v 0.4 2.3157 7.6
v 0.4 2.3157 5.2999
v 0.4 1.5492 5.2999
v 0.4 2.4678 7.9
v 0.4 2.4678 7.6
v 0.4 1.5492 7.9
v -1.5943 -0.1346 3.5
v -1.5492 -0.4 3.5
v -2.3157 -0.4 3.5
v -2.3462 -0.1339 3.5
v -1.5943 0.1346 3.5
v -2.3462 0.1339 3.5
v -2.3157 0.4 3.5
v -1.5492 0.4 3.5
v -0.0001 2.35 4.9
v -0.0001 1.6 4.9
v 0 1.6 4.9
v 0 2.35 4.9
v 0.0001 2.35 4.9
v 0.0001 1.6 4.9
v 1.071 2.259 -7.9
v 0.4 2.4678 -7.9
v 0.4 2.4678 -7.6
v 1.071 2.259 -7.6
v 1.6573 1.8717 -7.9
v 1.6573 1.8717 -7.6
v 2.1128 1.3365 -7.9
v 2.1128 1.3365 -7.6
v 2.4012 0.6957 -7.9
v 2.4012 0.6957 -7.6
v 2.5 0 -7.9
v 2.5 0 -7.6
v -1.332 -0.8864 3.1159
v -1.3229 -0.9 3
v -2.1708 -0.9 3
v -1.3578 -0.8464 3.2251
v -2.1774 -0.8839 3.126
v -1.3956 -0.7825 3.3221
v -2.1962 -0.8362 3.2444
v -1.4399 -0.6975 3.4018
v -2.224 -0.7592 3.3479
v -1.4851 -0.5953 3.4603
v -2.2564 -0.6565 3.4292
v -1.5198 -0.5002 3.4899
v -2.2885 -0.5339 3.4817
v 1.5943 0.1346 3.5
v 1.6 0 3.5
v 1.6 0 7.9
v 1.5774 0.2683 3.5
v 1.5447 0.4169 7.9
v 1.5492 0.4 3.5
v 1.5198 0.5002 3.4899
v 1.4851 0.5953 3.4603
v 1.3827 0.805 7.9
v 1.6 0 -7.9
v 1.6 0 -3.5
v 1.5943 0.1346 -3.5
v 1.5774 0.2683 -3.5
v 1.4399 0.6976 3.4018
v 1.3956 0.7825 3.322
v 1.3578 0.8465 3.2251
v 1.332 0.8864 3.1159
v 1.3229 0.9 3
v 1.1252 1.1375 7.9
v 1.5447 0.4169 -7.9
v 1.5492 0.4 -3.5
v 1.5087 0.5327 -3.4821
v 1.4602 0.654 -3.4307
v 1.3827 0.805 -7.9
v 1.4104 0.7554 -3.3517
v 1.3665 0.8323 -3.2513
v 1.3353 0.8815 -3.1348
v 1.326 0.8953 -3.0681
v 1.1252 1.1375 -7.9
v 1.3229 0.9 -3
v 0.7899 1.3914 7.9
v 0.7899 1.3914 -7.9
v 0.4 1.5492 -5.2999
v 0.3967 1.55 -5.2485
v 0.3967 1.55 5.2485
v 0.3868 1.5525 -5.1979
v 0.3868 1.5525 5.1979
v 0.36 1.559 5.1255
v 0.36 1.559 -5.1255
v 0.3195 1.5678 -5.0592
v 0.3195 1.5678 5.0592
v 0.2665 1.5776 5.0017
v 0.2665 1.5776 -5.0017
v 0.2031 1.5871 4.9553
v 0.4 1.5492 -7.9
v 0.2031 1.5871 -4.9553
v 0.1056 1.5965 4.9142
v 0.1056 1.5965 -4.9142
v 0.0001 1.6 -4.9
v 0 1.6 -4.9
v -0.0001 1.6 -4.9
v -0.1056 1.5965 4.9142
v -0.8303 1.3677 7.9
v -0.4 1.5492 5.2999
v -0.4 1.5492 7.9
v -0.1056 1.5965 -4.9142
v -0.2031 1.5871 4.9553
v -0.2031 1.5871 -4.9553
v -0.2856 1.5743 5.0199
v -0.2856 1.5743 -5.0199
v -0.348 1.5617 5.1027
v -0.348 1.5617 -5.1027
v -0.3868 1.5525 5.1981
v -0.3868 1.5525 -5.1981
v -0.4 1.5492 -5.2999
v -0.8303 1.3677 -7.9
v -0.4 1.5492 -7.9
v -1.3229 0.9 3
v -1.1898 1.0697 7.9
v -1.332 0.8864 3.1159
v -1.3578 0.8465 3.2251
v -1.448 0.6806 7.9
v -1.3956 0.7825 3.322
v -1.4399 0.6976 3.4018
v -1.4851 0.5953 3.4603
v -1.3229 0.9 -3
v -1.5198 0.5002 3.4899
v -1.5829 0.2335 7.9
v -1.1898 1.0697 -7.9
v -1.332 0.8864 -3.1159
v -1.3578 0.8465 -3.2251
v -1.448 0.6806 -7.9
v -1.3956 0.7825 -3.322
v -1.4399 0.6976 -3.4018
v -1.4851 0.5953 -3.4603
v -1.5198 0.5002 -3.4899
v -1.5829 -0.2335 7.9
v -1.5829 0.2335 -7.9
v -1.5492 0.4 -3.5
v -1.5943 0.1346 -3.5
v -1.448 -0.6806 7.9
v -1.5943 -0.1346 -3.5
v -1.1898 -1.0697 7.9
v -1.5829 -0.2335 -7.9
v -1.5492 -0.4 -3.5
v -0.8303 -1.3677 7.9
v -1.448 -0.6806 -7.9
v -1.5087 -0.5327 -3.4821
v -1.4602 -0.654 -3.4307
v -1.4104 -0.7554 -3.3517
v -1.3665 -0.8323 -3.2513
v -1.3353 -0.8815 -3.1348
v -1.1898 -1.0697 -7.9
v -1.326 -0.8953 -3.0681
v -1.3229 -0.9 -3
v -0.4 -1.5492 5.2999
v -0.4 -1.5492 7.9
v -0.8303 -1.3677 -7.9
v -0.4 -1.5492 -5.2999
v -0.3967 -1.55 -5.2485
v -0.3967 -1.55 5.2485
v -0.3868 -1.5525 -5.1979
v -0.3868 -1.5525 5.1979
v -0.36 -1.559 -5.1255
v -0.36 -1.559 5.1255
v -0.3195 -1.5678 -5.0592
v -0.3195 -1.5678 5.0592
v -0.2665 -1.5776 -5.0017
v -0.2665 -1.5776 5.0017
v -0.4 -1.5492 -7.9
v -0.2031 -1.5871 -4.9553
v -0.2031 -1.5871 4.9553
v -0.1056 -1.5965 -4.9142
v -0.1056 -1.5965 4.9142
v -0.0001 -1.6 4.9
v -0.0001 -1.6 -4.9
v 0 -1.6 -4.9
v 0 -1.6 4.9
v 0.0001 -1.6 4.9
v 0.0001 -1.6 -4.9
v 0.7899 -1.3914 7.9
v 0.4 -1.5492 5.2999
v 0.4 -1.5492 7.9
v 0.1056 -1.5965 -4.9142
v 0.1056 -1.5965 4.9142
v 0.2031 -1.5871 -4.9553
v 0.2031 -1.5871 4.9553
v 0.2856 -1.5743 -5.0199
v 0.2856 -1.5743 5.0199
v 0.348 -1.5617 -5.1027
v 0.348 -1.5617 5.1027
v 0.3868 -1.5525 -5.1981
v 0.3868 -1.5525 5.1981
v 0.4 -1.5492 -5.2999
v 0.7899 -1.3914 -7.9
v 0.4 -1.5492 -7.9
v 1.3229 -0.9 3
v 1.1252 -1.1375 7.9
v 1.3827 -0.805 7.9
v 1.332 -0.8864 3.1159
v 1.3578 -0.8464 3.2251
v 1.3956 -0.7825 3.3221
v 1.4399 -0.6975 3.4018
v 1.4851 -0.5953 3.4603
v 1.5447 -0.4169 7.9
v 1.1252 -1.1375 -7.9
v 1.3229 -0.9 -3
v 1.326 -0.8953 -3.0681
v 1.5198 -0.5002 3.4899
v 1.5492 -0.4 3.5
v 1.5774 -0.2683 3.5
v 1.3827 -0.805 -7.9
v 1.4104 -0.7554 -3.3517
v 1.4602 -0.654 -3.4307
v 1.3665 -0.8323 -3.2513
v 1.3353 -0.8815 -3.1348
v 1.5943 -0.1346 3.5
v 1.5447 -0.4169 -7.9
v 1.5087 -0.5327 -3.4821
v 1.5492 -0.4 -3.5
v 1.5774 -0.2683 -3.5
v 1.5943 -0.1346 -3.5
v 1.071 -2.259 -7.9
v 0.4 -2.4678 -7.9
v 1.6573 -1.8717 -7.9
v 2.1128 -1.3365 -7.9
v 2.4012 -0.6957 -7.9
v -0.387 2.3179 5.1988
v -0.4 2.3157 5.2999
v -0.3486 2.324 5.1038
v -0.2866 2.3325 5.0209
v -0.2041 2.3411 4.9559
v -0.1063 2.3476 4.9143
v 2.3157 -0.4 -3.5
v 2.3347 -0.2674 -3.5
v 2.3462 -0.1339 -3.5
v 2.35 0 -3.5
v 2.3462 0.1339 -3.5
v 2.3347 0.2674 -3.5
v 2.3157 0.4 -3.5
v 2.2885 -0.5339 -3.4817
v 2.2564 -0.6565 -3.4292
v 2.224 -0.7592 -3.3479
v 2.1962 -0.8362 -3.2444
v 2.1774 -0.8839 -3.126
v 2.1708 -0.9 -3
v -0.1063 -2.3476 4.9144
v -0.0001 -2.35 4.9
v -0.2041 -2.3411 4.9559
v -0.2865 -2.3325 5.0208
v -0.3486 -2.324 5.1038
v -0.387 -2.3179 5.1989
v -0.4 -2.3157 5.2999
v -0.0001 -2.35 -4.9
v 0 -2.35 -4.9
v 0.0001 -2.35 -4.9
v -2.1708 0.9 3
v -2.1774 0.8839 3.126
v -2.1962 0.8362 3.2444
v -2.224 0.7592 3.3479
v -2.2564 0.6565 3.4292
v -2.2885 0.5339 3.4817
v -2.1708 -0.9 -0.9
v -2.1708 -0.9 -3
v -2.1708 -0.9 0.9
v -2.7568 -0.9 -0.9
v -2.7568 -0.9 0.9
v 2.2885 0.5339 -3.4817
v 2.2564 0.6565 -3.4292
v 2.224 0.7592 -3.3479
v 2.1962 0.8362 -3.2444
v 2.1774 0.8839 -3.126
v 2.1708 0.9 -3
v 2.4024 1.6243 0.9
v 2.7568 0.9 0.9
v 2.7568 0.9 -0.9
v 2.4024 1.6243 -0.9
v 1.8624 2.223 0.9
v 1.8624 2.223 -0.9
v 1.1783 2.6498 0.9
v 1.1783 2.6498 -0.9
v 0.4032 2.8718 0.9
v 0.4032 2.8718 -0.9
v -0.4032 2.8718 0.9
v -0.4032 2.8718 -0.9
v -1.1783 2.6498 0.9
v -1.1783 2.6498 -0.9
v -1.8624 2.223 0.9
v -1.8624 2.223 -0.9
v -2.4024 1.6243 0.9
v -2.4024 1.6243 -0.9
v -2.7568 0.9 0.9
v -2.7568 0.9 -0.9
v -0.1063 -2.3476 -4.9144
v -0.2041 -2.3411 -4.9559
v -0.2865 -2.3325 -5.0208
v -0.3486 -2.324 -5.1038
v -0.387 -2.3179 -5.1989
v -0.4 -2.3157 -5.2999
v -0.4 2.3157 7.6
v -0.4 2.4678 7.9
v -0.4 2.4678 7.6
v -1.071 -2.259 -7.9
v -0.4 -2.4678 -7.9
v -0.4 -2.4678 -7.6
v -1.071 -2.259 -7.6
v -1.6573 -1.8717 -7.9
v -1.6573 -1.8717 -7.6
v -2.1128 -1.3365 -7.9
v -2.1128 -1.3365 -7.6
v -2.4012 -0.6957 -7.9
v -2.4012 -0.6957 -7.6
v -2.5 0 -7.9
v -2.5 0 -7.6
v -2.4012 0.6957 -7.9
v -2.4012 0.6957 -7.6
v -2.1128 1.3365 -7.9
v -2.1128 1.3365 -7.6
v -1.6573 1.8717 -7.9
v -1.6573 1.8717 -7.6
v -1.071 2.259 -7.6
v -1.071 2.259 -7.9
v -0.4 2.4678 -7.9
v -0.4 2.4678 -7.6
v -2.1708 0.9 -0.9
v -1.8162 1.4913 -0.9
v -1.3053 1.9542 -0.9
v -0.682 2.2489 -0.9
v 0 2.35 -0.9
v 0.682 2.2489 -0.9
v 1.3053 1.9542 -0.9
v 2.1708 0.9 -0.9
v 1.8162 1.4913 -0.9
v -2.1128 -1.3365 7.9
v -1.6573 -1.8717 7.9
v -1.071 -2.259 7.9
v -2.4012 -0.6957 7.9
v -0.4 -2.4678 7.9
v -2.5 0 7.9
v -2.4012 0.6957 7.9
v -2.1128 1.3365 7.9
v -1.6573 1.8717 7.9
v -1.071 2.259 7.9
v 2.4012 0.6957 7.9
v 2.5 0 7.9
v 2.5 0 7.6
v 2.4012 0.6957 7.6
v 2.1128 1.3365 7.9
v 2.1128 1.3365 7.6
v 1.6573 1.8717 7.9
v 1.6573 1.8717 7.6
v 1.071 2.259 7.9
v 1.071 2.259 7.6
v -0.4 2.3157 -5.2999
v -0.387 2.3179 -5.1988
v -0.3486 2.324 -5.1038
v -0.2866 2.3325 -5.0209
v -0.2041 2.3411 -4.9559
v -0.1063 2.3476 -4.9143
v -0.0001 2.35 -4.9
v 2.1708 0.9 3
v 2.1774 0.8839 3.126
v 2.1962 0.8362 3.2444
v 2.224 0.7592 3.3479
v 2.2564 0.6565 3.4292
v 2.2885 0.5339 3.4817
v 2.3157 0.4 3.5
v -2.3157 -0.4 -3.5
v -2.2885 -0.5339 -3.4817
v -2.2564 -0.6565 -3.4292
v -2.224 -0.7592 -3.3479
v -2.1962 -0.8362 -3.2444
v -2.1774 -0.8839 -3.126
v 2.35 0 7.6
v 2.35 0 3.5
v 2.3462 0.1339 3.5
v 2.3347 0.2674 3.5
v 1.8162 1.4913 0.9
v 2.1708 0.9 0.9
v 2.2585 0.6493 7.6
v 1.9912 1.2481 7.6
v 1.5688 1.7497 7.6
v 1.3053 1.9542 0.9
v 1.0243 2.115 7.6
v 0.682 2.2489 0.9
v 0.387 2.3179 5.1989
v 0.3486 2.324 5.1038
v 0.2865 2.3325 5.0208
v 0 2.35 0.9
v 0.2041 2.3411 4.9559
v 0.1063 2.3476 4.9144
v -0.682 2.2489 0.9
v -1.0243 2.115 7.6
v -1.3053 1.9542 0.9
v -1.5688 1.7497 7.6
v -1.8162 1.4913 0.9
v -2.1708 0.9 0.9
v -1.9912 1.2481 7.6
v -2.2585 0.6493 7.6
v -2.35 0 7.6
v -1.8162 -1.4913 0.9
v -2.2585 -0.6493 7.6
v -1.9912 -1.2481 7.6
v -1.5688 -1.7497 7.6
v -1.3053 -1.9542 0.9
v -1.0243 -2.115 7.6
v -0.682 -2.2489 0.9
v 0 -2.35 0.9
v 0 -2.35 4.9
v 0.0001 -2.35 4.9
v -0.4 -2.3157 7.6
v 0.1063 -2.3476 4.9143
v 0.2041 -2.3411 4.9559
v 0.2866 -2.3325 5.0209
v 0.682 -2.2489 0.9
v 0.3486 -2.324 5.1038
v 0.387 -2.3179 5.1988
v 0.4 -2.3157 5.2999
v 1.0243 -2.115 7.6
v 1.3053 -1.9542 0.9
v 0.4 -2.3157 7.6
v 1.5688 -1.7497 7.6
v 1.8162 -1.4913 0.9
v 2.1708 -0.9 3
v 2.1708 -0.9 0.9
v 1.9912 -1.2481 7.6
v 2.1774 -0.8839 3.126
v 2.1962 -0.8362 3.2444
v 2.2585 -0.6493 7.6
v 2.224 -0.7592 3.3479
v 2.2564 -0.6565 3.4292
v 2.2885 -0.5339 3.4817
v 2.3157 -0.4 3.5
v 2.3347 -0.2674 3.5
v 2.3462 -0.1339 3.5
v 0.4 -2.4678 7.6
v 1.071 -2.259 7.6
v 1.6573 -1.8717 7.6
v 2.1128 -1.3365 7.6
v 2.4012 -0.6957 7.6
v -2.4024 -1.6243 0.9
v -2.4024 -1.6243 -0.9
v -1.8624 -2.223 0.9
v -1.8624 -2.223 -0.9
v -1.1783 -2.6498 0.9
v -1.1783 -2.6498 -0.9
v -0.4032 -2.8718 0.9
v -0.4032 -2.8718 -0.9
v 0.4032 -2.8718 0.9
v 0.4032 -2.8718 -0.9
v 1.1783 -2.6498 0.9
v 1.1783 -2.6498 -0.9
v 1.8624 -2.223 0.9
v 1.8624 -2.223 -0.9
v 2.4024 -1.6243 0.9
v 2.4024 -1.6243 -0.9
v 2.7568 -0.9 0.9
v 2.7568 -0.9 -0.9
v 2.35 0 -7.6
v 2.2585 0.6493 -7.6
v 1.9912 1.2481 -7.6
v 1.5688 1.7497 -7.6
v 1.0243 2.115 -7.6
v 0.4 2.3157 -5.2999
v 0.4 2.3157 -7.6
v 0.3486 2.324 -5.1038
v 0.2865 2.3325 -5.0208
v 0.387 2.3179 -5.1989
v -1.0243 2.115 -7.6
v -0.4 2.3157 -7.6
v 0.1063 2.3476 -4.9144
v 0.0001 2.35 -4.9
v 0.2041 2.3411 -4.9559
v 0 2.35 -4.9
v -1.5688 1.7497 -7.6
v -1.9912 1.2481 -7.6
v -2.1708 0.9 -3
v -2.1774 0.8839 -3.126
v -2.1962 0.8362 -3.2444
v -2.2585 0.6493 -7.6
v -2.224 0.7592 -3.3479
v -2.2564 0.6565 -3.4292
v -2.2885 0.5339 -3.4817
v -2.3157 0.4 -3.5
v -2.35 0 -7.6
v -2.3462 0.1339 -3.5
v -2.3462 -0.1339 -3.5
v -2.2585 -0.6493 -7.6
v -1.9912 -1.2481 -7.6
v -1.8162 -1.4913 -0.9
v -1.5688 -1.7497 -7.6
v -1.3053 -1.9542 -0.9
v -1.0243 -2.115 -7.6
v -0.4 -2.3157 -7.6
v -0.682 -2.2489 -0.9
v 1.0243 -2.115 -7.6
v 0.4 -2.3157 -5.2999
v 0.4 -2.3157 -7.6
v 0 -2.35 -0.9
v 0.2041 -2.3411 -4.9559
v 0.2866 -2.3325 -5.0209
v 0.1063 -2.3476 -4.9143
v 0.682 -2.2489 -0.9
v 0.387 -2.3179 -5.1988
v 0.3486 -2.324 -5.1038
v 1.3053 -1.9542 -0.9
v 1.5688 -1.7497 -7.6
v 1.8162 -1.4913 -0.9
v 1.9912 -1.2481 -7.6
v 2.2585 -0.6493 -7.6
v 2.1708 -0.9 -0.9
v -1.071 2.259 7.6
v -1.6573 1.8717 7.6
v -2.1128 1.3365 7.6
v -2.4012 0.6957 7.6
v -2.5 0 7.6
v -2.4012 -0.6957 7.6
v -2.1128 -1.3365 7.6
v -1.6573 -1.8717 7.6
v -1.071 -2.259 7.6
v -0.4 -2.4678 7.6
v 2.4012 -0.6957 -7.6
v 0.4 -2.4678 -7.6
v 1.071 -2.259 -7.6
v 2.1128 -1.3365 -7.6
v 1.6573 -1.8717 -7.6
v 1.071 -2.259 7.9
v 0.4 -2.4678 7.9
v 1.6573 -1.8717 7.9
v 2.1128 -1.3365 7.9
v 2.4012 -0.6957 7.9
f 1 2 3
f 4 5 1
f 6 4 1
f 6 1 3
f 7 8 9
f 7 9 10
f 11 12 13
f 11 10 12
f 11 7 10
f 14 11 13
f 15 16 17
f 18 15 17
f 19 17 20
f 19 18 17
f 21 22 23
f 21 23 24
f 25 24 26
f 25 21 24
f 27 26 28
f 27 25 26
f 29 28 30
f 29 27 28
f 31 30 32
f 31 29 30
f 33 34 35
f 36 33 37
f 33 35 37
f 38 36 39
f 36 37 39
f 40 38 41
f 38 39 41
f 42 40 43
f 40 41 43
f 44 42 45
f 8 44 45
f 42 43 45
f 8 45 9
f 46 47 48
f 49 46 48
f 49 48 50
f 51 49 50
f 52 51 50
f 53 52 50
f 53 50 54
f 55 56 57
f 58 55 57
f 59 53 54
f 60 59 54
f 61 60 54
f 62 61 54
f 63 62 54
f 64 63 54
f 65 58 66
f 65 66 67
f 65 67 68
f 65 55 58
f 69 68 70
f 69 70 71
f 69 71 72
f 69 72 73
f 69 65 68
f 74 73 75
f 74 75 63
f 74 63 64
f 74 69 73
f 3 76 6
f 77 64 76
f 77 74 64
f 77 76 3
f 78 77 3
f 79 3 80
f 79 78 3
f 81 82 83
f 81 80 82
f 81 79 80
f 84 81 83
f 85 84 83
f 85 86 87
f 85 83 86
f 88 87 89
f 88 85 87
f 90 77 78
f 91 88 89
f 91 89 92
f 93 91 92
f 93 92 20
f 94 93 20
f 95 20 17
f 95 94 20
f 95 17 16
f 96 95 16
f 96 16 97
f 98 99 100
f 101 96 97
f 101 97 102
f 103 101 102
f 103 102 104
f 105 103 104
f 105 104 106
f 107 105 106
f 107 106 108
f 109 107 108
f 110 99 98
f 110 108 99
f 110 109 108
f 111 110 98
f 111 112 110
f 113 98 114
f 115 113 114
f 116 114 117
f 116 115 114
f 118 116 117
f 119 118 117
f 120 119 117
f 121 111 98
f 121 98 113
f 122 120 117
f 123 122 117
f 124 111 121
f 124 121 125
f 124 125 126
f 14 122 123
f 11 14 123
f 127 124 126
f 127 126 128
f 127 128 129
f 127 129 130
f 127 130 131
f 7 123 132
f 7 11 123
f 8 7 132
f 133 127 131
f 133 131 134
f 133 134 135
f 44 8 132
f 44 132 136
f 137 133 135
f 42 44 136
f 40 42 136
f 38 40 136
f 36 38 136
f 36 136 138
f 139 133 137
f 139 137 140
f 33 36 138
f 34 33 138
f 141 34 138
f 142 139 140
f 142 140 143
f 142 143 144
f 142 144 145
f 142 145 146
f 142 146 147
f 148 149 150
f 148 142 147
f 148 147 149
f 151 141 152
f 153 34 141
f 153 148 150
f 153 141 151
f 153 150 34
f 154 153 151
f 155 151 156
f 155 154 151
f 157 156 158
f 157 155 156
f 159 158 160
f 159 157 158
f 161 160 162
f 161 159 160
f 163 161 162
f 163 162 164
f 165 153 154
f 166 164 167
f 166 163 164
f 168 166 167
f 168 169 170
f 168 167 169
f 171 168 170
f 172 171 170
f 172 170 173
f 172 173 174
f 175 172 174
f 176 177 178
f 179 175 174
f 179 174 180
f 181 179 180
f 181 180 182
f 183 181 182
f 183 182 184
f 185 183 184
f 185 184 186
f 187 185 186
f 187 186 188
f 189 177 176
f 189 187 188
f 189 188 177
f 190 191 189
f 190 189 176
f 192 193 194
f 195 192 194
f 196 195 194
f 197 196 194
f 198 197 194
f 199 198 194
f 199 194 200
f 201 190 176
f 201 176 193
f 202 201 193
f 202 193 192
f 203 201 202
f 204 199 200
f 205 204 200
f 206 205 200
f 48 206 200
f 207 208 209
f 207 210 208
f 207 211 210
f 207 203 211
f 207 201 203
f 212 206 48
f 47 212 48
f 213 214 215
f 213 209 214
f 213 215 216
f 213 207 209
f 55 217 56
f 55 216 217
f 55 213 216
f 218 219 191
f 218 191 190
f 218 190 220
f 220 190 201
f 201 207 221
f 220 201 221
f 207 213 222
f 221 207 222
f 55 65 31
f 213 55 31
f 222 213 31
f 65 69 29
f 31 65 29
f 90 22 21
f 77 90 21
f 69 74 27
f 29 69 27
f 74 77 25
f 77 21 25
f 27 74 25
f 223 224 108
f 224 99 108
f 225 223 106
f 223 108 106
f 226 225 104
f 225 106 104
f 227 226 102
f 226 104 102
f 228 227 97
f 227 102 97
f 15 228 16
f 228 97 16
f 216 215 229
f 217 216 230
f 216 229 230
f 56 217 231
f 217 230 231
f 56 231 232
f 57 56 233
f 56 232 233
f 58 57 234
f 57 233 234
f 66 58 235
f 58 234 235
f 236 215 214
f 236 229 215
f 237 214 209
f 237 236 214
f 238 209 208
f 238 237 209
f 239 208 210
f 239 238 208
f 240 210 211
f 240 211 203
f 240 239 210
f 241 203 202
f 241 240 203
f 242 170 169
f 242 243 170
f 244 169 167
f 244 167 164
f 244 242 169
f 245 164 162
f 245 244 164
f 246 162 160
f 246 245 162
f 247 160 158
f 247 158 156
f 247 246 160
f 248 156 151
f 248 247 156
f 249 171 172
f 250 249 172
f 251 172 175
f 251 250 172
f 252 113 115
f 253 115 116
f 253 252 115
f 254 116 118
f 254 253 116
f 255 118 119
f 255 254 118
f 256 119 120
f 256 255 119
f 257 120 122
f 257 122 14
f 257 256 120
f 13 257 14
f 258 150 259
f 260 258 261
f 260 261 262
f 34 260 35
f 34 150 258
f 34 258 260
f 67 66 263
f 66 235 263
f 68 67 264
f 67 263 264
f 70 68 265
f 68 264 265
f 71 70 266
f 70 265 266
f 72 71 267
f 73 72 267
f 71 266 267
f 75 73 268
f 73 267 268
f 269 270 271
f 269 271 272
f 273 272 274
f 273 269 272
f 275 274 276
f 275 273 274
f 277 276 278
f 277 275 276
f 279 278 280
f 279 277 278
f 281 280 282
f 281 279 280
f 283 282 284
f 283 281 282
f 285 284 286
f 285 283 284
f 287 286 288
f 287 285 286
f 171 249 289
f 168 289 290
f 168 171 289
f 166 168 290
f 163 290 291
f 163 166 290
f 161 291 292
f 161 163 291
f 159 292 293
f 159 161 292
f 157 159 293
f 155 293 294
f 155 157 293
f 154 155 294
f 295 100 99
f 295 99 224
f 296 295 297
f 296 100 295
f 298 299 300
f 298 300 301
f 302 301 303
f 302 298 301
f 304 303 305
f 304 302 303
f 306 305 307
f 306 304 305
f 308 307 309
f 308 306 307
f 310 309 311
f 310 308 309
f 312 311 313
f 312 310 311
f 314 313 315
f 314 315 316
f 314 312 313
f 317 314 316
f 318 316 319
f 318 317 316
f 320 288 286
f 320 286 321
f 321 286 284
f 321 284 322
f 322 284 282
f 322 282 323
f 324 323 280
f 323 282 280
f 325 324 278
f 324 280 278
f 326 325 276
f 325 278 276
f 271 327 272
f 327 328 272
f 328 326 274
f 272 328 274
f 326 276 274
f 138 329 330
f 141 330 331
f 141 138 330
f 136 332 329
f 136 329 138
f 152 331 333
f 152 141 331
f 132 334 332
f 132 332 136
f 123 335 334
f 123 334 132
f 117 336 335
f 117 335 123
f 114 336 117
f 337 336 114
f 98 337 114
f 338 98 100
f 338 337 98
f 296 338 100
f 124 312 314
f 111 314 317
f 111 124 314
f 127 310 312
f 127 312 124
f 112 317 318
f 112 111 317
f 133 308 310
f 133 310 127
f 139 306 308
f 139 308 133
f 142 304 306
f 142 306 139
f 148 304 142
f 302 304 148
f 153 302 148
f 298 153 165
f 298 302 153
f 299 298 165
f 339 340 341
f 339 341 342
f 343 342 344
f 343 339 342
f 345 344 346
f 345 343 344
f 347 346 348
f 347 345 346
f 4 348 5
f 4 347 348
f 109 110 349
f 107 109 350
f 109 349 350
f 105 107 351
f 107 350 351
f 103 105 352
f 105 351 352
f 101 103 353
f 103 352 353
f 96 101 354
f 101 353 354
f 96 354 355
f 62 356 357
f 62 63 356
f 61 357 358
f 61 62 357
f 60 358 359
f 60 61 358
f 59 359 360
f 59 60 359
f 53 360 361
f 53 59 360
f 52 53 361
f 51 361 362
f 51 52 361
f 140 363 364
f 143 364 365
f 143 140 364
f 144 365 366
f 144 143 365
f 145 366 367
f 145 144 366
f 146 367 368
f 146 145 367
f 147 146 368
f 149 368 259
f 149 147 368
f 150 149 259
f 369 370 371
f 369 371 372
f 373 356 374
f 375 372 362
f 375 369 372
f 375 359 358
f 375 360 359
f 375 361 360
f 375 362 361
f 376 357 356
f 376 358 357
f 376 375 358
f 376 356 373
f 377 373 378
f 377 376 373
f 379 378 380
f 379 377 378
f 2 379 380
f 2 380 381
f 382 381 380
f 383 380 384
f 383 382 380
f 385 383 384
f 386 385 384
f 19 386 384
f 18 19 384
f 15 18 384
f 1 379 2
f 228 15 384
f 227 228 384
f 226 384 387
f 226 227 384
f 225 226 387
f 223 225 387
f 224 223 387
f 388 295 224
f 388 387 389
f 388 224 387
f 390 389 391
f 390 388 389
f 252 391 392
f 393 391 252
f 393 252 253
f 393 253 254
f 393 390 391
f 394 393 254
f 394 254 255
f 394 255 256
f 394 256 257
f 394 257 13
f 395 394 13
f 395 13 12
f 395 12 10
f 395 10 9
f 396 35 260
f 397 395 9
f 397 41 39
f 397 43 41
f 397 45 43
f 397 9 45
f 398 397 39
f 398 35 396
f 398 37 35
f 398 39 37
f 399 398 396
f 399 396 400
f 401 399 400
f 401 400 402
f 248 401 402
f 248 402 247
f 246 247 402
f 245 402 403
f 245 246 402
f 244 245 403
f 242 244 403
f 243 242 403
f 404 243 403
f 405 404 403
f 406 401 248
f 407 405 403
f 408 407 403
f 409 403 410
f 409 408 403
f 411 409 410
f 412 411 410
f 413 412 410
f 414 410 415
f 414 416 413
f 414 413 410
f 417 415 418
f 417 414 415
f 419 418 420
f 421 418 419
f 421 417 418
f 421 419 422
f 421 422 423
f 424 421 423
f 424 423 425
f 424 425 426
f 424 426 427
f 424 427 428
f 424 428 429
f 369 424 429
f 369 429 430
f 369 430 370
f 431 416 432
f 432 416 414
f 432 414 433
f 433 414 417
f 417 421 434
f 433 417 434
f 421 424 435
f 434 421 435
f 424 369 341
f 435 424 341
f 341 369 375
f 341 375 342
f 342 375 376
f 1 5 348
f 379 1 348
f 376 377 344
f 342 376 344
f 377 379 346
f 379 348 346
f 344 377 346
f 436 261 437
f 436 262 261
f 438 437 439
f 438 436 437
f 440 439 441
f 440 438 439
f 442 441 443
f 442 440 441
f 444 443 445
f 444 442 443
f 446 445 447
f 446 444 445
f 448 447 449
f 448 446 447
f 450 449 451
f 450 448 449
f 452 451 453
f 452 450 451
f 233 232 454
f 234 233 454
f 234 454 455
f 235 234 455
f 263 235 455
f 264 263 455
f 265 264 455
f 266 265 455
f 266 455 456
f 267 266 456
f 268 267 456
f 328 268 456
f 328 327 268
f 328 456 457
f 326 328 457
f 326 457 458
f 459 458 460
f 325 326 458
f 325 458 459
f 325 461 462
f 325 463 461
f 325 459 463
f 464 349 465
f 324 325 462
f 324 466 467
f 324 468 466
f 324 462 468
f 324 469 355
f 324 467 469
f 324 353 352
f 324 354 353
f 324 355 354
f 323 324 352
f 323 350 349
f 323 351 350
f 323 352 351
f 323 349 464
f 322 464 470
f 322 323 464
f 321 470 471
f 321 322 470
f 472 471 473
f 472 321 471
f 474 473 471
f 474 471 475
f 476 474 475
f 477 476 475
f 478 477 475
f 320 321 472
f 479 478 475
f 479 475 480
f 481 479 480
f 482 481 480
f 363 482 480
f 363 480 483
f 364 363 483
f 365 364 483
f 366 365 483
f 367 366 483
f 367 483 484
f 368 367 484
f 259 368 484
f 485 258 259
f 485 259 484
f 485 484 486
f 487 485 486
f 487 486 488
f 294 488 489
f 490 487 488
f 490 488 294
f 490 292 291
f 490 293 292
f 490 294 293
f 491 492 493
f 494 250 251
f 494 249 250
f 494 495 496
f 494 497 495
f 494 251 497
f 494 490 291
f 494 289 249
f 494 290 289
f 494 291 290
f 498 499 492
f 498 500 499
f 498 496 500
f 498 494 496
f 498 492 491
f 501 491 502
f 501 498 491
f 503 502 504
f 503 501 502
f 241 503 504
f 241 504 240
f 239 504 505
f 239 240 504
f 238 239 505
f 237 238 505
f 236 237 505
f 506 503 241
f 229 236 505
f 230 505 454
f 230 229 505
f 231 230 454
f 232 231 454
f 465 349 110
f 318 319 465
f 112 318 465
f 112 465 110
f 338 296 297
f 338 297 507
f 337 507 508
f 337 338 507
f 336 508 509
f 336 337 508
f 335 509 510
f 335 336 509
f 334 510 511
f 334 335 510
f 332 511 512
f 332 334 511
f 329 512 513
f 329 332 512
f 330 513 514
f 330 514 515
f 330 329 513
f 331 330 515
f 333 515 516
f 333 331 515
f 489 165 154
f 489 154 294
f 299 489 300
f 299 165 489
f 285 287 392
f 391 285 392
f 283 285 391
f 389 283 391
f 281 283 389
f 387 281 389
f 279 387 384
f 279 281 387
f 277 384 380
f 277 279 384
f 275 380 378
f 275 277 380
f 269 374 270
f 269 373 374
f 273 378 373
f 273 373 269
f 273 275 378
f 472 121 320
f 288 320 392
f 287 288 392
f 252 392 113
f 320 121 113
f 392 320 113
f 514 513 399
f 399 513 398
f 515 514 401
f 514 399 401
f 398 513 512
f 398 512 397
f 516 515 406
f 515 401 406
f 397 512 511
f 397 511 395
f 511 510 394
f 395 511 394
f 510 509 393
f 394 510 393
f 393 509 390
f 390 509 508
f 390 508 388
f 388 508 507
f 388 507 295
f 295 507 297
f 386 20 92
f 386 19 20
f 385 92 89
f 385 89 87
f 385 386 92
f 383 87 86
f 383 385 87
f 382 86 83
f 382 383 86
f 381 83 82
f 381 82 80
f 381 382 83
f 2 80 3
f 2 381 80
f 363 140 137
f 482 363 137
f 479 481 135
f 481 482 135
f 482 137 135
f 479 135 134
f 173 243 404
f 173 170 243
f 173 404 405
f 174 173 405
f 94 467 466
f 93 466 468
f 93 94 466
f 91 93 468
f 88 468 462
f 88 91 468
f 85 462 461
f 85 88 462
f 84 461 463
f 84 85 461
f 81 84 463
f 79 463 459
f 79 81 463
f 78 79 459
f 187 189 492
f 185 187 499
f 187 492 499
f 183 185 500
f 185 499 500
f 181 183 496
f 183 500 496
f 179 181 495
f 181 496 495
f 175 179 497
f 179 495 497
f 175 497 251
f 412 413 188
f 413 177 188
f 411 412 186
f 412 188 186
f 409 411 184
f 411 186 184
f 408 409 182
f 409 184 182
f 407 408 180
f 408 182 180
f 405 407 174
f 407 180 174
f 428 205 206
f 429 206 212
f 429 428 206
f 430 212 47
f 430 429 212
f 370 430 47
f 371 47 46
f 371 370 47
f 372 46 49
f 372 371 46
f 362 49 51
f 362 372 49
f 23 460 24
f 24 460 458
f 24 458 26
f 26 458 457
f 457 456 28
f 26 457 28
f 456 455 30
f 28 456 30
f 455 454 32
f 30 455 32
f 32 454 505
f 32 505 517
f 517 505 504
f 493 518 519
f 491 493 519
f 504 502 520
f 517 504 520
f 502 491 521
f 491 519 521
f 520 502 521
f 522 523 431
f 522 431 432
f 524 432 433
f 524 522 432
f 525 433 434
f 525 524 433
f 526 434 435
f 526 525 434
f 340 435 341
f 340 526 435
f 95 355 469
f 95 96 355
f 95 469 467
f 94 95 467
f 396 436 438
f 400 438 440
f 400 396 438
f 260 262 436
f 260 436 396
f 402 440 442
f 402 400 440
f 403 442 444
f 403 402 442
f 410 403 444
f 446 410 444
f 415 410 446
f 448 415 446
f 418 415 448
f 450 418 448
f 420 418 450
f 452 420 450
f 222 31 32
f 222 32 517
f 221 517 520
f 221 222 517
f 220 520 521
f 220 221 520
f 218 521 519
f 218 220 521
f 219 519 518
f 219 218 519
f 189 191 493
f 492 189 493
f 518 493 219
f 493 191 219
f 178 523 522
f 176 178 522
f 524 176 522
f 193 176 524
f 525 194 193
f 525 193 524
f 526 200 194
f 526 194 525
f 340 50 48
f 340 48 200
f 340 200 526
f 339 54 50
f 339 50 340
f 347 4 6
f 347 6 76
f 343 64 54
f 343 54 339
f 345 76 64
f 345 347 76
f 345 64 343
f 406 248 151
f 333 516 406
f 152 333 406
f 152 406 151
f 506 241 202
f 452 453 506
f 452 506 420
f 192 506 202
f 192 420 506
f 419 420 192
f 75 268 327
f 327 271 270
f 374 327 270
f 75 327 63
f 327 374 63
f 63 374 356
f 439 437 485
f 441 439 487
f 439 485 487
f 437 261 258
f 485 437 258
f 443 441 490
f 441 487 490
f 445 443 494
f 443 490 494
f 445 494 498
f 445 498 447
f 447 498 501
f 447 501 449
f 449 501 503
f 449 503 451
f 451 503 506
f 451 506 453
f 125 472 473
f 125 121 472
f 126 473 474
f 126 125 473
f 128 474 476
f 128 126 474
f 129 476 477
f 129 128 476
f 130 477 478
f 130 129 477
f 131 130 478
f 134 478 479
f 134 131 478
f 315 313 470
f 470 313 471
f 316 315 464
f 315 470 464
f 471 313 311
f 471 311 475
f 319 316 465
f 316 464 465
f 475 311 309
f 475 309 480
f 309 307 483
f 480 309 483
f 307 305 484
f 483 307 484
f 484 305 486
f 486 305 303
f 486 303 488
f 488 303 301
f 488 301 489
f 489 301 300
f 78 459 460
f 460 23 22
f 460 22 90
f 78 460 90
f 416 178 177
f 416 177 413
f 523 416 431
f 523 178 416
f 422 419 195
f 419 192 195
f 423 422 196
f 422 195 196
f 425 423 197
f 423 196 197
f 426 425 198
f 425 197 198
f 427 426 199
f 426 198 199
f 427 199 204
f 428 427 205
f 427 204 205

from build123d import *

# Parameters (mm, degrees)
F0_R      = 2.35
F0_R_2    = 1.6
F1_DEPTH  = 7.9
F3_DEPTH  = 3
F0_R_3    = 2.9
F4_DEPTH  = 0.9
F5_W      = 1.8
F5_H      = 7
F6_DEPTH  = 12.5
F7_R      = 0.5
F9_DEPTH  = 3
F10_R     = 0.3999
F12_DEPTH = 0.3
F14_DEPTH = 0.3
F16_DEPTH = 0.3


# Not quite as in the source:
# - a fillet or chamfer is up to 0.001 mm smaller than in the source, because OpenCascade refuses the exact size


with BuildPart() as f1:
    # F0 (on Top) → F1 (new body, symmetric)
    with BuildSketch(Plane.XY):
        Circle(F0_R)
        Circle(F0_R_2, mode=Mode.SUBTRACT)
    extrude(amount=F1_DEPTH, both=True)

    # F2 (on face) → F3 (cut)
    with BuildSketch(Plane.XY.offset(7.9)):
        with BuildLine():
            ThreePointArc((-0.4, 1.5491933385), (-0.201606868, 1.587247514), (0, 1.6))
            ThreePointArc((0, 1.6), (0.201606868, 1.587247514), (0.4, 1.5491933385))
            Line((0.4, 1.5491933385), (0.4, 1.6))
            Line((0.4, 1.6), (0.4, 2.3157072354))
            ThreePointArc((0.4, 2.3157072354), (0, 2.35), (-0.4, 2.3157072354))
            Line((-0.4, 2.3157072354), (-0.4, 1.6))
            Line((-0.4, 1.6), (-0.4, 1.5491933385))
        make_face()
        with BuildLine():
            ThreePointArc((0.4, -1.5491933385), (0.201606868, -1.587247514), (0, -1.6))
            ThreePointArc((0, -1.6), (-0.201606868, -1.587247514), (-0.4, -1.5491933385))
            Line((-0.4, -1.5491933385), (-0.4, -1.6))
            Line((-0.4, -1.6), (-0.4, -2.3157072354))
            ThreePointArc((-0.4, -2.3157072354), (0, -2.35), (0.4, -2.3157072354))
            Line((0.4, -2.3157072354), (0.4, -1.6))
            Line((0.4, -1.6), (0.4, -1.5491933385))
        make_face()
    extrude(amount=-F3_DEPTH, mode=Mode.SUBTRACT)

    # F0 (on Top) → F4 (join, symmetric)
    with BuildSketch(Plane.XY):
        Circle(F0_R_3)
        Circle(F0_R, mode=Mode.SUBTRACT)
    extrude(amount=F4_DEPTH, both=True)

    # F5 (on Right) → F6 (cut, symmetric)
    with BuildSketch(Plane.YZ):
        Rectangle(F5_W, F5_H)
    extrude(amount=F6_DEPTH, both=True, mode=Mode.SUBTRACT)

    # F7
    f7_edges = [f1.edges().sort_by_distance(p)[0] for p in [
        (-1.746852, -0.9, 3.5),
        (1.746852, -0.9, 3.5),
        (1.746852, 0.9, 3.5),
        (-1.746852, 0.9, 3.5),
        (1.746852, -0.9, -3.5),
        (-1.746852, -0.9, -3.5),
        (1.746852, 0.9, -3.5),
        (-1.746852, 0.9, -3.5),
    ]]
    fillet(f7_edges, radius=F7_R)

    # F8 (on face) → F9 (cut)
    with BuildSketch(Plane(origin=(0, 0, -7.9), x_dir=(1, 0, 0), z_dir=(0, 0, -1))):
        with BuildLine():
            Line((0.4, 1.5491933385), (0.4, 1.6))
            Line((0.4, 1.6), (0.4, 2.3157072354))
            ThreePointArc((0.4, 2.3157072354), (0, 2.35), (-0.4, 2.3157072354))
            Line((-0.4, 2.3157072354), (-0.4, 1.6))
            Line((-0.4, 1.6), (-0.4, 1.5491933385))
            ThreePointArc((-0.4, 1.5491933385), (0, 1.6), (0.4, 1.5491933385))
        make_face()
        with BuildLine():
            ThreePointArc((-0.4, -2.3157072354), (0, -2.35), (0.4, -2.3157072354))
            Line((0.4, -2.3157072354), (0.4, -1.6))
            Line((0.4, -1.6), (0.4, -1.5491933385))
            ThreePointArc((0.4, -1.5491933385), (0, -1.6), (-0.4, -1.5491933385))
            Line((-0.4, -1.5491933385), (-0.4, -1.6))
            Line((-0.4, -1.6), (-0.4, -2.3157072354))
        make_face()
    extrude(amount=-F9_DEPTH, mode=Mode.SUBTRACT)

    # F10 (radius 0.4 in the source; OpenCascade refuses exactly that, so slightly less here)
    f10_edges = [f1.edges().sort_by_distance(p)[0] for p in [
        (0.4, -1.93245, -4.9),
        (-0.4, -1.93245, -4.9),
        (-0.4, 1.93245, -4.9),
        (0.4, 1.93245, -4.9),
        (0.4, 1.93245, 4.9),
        (-0.4, 1.93245, 4.9),
        (-0.4, -1.93245, 4.9),
        (0.4, -1.93245, 4.9),
    ]]
    fillet(f10_edges, radius=F10_R)

    # F11 (on face) → F12 (join)
    with BuildSketch(Plane(origin=(0, 0, -7.9), x_dir=(1, 0, 0), z_dir=(0, 0, -1))):
        with BuildLine():
            Line((-0.4, 2.3157072354), (-0.4, 2.4677925359))
            ThreePointArc((-0.4, 2.4677925359), (-2.5, 0), (-0.4, -2.4677925359))
            Line((-0.4, -2.4677925359), (-0.4, -2.3157072354))
            ThreePointArc((-0.4, -2.3157072354), (-2.35, 0), (-0.4, 2.3157072354))
        make_face()
        with BuildLine():
            ThreePointArc((0.4, -2.4677925359), (1.9039432765, -1.6201851746), (2.5, 0))
            ThreePointArc((2.5, 0), (1.9039432765, 1.6201851746), (0.4, 2.4677925359))
            Line((0.4, 2.4677925359), (0.4, 2.3157072354))
            ThreePointArc((0.4, 2.3157072354), (1.7975678012, 1.5136875503), (2.35, 0))
            ThreePointArc((2.35, 0), (1.7975678012, -1.5136875503), (0.4, -2.3157072354))
            Line((0.4, -2.3157072354), (0.4, -2.4677925359))
        make_face()
    extrude(amount=-F12_DEPTH)

    # F13 (on face) → F14 (join)
    with BuildSketch(Plane.XY.offset(7.9)):
        with BuildLine():
            Line((-0.4, 2.3157072354), (-0.4, 2.4677925359))
            ThreePointArc((-0.4, 2.4677925359), (-2.5, 0), (-0.4, -2.4677925359))
            Line((-0.4, -2.4677925359), (-0.4, -2.3157072354))
            ThreePointArc((-0.4, -2.3157072354), (-2.35, 0), (-0.4, 2.3157072354))
        make_face()
    extrude(amount=-F14_DEPTH)

    # F15 (on face) → F16 (join)
    with BuildSketch(Plane.XY.offset(7.9)):
        with BuildLine():
            ThreePointArc((0.4, -2.4677925359), (1.9039432765, -1.6201851746), (2.5, 0))
            ThreePointArc((2.5, 0), (1.9039432765, 1.6201851746), (0.4, 2.4677925359))
            Line((0.4, 2.4677925359), (0.4, 2.3157072354))
            ThreePointArc((0.4, 2.3157072354), (1.7975678012, 1.5136875503), (2.35, 0))
            ThreePointArc((2.35, 0), (1.7975678012, -1.5136875503), (0.4, -2.3157072354))
            Line((0.4, -2.3157072354), (0.4, -2.4677925359))
        make_face()
    extrude(amount=-F16_DEPTH)


solid = f1.part
